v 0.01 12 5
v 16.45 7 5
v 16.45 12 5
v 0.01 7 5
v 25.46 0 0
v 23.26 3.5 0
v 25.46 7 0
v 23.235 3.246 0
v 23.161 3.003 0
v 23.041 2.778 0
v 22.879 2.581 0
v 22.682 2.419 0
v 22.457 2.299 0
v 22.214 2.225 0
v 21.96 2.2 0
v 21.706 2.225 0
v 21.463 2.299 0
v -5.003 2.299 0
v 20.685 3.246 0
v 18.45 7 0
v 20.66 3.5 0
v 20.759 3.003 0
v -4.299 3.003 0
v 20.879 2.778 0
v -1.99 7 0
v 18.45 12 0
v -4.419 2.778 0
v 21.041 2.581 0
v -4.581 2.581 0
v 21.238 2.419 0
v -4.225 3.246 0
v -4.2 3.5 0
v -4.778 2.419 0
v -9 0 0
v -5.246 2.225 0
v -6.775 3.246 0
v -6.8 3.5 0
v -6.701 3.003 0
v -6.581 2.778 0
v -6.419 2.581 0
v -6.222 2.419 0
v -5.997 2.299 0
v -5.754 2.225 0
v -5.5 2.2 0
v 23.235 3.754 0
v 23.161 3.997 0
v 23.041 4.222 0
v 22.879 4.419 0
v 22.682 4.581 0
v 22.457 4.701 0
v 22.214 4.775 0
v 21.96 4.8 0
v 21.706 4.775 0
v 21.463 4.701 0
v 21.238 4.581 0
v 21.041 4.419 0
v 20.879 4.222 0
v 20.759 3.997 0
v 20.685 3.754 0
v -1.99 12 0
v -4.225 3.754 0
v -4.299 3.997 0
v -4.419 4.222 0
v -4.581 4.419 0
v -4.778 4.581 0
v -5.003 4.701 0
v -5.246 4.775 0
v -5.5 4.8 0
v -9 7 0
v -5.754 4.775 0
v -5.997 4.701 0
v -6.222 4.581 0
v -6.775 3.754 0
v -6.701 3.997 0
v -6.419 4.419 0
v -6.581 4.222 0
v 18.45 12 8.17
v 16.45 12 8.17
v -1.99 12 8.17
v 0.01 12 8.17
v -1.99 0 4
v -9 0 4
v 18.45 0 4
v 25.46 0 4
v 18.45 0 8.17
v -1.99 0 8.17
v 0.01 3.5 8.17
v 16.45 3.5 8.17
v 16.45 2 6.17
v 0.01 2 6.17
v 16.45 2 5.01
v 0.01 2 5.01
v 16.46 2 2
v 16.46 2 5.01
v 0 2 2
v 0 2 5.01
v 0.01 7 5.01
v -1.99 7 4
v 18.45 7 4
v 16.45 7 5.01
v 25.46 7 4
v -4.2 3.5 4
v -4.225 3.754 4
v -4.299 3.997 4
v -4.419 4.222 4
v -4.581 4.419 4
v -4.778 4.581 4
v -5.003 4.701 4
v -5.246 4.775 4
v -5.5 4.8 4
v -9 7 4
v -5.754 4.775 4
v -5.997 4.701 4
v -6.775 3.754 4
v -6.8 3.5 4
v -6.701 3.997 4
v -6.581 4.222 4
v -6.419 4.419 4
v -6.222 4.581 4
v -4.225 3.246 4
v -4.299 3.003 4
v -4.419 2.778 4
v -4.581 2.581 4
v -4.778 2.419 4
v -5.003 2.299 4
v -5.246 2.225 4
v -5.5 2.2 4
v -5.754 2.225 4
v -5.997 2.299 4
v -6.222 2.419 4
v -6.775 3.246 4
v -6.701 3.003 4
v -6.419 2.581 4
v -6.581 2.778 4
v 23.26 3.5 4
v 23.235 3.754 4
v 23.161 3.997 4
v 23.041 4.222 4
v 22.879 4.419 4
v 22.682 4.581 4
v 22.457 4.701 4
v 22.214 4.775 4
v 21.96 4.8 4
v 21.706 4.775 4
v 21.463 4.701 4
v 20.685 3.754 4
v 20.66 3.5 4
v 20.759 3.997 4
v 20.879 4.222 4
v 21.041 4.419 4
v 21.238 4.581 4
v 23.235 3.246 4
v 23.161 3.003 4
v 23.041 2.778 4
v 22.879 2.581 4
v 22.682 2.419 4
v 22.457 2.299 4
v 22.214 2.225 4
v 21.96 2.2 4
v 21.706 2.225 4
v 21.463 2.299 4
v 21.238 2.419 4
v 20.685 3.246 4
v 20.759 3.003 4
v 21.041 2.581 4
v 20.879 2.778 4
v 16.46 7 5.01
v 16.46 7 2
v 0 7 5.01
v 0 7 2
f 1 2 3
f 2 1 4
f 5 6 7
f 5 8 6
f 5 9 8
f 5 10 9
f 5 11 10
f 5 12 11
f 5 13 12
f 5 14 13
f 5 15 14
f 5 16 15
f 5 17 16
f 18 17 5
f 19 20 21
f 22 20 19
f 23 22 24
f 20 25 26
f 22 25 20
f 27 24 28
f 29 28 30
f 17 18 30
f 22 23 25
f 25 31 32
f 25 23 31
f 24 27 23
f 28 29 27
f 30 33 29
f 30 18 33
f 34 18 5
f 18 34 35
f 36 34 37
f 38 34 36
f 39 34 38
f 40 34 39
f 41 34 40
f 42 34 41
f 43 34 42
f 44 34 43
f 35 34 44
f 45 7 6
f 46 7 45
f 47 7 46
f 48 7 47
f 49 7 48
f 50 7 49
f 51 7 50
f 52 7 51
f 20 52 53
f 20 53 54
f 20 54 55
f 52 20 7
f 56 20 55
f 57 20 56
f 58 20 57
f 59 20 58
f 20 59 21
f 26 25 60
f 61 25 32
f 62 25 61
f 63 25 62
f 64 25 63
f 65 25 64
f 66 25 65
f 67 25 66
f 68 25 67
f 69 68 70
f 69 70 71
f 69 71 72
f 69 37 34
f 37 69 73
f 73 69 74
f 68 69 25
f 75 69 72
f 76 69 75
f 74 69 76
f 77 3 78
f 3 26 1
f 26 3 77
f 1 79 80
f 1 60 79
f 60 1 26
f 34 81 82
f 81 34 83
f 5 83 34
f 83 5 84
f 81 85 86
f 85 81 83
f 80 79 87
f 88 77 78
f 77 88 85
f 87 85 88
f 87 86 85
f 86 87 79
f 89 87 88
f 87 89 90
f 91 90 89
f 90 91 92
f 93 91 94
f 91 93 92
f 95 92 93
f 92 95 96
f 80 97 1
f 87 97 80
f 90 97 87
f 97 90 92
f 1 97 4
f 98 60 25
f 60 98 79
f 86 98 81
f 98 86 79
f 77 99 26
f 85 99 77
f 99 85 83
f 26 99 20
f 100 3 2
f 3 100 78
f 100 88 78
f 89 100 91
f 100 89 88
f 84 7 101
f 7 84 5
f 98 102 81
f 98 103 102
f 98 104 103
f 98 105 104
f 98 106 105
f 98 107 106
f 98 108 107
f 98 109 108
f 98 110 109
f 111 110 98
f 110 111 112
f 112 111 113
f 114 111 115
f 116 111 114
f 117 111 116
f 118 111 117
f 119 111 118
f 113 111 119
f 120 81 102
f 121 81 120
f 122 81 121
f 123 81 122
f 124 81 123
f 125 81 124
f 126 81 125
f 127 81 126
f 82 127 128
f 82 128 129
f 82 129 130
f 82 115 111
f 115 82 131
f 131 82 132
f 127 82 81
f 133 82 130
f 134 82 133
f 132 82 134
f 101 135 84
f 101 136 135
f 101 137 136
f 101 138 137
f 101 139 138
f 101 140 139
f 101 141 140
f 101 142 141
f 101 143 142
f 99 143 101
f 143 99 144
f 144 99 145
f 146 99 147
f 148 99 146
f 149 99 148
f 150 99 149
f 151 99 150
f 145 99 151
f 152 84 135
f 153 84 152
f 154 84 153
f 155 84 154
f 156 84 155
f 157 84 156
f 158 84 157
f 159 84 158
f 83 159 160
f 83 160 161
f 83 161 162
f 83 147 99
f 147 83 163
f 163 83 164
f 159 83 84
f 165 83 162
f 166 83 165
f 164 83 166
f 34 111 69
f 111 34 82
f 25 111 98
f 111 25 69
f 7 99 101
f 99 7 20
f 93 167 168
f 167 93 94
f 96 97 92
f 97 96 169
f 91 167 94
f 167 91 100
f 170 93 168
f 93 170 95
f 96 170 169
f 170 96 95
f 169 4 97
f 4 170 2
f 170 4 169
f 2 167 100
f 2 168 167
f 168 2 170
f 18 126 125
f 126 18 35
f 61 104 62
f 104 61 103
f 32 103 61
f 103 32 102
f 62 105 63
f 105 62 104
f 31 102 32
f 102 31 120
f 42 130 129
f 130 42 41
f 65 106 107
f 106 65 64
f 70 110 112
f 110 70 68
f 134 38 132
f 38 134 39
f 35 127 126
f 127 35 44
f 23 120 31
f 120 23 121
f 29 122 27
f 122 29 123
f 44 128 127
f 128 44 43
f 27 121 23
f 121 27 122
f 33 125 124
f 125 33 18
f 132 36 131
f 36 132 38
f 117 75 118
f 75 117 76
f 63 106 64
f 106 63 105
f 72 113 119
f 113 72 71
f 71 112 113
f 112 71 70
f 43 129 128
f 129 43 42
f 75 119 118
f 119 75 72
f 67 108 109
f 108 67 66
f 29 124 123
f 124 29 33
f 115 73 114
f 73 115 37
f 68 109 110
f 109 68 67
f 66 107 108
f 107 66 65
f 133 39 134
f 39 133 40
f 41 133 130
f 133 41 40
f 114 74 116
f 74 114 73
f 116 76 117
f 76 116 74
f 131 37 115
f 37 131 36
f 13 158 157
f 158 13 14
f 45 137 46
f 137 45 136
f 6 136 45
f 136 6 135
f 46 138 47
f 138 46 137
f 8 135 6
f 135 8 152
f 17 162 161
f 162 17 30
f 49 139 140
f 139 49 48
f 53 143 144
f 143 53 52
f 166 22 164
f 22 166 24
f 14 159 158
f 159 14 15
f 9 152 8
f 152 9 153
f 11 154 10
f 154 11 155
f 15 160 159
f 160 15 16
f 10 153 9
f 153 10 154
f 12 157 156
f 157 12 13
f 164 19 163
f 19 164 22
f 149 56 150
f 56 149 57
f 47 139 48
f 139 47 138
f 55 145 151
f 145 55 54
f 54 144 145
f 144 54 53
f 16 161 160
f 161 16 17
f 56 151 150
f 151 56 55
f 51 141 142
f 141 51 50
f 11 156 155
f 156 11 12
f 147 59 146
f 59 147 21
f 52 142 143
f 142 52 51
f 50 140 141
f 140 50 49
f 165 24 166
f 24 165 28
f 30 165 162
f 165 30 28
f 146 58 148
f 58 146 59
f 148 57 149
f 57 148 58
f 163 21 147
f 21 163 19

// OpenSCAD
use <tubemesh.scad>;

w=16.06+0.4;
h=5;
troughDepth=3;
troughThickness=5;
length=10;
wings=4;
thickness=1.17;

screwHoleSize = 2.6;
screwLength = 10;
screwPillarDiameter = 7;

nudge = 0.01;

$fn=32;
render(convexity=3)
difference() {
    union() {
        cube([w,length+2,h]);
        prism(base=[[0,0,h-nudge],[0,0,h+thickness+2],[0,3.5,h+thickness+2],[0,2,h+thickness],[0,2,h-nudge]], vertical=[w,0,0]);
        translate([-2+nudge,0,0]) cube([2,length+2,h+thickness+2]);
        translate([w-nudge,0,0]) cube([2,length+2,h+thickness+2]);
        translate([-screwPillarDiameter-2,0,0])
        cube([w+4+screwPillarDiameter*2,screwPillarDiameter,4]);
    }
    translate([0,2,h-troughDepth]) cube([w,troughThickness,troughDepth+nudge]);
    translate([-screwPillarDiameter/2-2,screwPillarDiameter/2,-nudge]) cylinder(d=screwHoleSize,h=screwLength);
    translate([w+screwPillarDiameter/2+2,screwPillarDiameter/2,-nudge]) cylinder(d=screwHoleSize,h=screwLength);
}
